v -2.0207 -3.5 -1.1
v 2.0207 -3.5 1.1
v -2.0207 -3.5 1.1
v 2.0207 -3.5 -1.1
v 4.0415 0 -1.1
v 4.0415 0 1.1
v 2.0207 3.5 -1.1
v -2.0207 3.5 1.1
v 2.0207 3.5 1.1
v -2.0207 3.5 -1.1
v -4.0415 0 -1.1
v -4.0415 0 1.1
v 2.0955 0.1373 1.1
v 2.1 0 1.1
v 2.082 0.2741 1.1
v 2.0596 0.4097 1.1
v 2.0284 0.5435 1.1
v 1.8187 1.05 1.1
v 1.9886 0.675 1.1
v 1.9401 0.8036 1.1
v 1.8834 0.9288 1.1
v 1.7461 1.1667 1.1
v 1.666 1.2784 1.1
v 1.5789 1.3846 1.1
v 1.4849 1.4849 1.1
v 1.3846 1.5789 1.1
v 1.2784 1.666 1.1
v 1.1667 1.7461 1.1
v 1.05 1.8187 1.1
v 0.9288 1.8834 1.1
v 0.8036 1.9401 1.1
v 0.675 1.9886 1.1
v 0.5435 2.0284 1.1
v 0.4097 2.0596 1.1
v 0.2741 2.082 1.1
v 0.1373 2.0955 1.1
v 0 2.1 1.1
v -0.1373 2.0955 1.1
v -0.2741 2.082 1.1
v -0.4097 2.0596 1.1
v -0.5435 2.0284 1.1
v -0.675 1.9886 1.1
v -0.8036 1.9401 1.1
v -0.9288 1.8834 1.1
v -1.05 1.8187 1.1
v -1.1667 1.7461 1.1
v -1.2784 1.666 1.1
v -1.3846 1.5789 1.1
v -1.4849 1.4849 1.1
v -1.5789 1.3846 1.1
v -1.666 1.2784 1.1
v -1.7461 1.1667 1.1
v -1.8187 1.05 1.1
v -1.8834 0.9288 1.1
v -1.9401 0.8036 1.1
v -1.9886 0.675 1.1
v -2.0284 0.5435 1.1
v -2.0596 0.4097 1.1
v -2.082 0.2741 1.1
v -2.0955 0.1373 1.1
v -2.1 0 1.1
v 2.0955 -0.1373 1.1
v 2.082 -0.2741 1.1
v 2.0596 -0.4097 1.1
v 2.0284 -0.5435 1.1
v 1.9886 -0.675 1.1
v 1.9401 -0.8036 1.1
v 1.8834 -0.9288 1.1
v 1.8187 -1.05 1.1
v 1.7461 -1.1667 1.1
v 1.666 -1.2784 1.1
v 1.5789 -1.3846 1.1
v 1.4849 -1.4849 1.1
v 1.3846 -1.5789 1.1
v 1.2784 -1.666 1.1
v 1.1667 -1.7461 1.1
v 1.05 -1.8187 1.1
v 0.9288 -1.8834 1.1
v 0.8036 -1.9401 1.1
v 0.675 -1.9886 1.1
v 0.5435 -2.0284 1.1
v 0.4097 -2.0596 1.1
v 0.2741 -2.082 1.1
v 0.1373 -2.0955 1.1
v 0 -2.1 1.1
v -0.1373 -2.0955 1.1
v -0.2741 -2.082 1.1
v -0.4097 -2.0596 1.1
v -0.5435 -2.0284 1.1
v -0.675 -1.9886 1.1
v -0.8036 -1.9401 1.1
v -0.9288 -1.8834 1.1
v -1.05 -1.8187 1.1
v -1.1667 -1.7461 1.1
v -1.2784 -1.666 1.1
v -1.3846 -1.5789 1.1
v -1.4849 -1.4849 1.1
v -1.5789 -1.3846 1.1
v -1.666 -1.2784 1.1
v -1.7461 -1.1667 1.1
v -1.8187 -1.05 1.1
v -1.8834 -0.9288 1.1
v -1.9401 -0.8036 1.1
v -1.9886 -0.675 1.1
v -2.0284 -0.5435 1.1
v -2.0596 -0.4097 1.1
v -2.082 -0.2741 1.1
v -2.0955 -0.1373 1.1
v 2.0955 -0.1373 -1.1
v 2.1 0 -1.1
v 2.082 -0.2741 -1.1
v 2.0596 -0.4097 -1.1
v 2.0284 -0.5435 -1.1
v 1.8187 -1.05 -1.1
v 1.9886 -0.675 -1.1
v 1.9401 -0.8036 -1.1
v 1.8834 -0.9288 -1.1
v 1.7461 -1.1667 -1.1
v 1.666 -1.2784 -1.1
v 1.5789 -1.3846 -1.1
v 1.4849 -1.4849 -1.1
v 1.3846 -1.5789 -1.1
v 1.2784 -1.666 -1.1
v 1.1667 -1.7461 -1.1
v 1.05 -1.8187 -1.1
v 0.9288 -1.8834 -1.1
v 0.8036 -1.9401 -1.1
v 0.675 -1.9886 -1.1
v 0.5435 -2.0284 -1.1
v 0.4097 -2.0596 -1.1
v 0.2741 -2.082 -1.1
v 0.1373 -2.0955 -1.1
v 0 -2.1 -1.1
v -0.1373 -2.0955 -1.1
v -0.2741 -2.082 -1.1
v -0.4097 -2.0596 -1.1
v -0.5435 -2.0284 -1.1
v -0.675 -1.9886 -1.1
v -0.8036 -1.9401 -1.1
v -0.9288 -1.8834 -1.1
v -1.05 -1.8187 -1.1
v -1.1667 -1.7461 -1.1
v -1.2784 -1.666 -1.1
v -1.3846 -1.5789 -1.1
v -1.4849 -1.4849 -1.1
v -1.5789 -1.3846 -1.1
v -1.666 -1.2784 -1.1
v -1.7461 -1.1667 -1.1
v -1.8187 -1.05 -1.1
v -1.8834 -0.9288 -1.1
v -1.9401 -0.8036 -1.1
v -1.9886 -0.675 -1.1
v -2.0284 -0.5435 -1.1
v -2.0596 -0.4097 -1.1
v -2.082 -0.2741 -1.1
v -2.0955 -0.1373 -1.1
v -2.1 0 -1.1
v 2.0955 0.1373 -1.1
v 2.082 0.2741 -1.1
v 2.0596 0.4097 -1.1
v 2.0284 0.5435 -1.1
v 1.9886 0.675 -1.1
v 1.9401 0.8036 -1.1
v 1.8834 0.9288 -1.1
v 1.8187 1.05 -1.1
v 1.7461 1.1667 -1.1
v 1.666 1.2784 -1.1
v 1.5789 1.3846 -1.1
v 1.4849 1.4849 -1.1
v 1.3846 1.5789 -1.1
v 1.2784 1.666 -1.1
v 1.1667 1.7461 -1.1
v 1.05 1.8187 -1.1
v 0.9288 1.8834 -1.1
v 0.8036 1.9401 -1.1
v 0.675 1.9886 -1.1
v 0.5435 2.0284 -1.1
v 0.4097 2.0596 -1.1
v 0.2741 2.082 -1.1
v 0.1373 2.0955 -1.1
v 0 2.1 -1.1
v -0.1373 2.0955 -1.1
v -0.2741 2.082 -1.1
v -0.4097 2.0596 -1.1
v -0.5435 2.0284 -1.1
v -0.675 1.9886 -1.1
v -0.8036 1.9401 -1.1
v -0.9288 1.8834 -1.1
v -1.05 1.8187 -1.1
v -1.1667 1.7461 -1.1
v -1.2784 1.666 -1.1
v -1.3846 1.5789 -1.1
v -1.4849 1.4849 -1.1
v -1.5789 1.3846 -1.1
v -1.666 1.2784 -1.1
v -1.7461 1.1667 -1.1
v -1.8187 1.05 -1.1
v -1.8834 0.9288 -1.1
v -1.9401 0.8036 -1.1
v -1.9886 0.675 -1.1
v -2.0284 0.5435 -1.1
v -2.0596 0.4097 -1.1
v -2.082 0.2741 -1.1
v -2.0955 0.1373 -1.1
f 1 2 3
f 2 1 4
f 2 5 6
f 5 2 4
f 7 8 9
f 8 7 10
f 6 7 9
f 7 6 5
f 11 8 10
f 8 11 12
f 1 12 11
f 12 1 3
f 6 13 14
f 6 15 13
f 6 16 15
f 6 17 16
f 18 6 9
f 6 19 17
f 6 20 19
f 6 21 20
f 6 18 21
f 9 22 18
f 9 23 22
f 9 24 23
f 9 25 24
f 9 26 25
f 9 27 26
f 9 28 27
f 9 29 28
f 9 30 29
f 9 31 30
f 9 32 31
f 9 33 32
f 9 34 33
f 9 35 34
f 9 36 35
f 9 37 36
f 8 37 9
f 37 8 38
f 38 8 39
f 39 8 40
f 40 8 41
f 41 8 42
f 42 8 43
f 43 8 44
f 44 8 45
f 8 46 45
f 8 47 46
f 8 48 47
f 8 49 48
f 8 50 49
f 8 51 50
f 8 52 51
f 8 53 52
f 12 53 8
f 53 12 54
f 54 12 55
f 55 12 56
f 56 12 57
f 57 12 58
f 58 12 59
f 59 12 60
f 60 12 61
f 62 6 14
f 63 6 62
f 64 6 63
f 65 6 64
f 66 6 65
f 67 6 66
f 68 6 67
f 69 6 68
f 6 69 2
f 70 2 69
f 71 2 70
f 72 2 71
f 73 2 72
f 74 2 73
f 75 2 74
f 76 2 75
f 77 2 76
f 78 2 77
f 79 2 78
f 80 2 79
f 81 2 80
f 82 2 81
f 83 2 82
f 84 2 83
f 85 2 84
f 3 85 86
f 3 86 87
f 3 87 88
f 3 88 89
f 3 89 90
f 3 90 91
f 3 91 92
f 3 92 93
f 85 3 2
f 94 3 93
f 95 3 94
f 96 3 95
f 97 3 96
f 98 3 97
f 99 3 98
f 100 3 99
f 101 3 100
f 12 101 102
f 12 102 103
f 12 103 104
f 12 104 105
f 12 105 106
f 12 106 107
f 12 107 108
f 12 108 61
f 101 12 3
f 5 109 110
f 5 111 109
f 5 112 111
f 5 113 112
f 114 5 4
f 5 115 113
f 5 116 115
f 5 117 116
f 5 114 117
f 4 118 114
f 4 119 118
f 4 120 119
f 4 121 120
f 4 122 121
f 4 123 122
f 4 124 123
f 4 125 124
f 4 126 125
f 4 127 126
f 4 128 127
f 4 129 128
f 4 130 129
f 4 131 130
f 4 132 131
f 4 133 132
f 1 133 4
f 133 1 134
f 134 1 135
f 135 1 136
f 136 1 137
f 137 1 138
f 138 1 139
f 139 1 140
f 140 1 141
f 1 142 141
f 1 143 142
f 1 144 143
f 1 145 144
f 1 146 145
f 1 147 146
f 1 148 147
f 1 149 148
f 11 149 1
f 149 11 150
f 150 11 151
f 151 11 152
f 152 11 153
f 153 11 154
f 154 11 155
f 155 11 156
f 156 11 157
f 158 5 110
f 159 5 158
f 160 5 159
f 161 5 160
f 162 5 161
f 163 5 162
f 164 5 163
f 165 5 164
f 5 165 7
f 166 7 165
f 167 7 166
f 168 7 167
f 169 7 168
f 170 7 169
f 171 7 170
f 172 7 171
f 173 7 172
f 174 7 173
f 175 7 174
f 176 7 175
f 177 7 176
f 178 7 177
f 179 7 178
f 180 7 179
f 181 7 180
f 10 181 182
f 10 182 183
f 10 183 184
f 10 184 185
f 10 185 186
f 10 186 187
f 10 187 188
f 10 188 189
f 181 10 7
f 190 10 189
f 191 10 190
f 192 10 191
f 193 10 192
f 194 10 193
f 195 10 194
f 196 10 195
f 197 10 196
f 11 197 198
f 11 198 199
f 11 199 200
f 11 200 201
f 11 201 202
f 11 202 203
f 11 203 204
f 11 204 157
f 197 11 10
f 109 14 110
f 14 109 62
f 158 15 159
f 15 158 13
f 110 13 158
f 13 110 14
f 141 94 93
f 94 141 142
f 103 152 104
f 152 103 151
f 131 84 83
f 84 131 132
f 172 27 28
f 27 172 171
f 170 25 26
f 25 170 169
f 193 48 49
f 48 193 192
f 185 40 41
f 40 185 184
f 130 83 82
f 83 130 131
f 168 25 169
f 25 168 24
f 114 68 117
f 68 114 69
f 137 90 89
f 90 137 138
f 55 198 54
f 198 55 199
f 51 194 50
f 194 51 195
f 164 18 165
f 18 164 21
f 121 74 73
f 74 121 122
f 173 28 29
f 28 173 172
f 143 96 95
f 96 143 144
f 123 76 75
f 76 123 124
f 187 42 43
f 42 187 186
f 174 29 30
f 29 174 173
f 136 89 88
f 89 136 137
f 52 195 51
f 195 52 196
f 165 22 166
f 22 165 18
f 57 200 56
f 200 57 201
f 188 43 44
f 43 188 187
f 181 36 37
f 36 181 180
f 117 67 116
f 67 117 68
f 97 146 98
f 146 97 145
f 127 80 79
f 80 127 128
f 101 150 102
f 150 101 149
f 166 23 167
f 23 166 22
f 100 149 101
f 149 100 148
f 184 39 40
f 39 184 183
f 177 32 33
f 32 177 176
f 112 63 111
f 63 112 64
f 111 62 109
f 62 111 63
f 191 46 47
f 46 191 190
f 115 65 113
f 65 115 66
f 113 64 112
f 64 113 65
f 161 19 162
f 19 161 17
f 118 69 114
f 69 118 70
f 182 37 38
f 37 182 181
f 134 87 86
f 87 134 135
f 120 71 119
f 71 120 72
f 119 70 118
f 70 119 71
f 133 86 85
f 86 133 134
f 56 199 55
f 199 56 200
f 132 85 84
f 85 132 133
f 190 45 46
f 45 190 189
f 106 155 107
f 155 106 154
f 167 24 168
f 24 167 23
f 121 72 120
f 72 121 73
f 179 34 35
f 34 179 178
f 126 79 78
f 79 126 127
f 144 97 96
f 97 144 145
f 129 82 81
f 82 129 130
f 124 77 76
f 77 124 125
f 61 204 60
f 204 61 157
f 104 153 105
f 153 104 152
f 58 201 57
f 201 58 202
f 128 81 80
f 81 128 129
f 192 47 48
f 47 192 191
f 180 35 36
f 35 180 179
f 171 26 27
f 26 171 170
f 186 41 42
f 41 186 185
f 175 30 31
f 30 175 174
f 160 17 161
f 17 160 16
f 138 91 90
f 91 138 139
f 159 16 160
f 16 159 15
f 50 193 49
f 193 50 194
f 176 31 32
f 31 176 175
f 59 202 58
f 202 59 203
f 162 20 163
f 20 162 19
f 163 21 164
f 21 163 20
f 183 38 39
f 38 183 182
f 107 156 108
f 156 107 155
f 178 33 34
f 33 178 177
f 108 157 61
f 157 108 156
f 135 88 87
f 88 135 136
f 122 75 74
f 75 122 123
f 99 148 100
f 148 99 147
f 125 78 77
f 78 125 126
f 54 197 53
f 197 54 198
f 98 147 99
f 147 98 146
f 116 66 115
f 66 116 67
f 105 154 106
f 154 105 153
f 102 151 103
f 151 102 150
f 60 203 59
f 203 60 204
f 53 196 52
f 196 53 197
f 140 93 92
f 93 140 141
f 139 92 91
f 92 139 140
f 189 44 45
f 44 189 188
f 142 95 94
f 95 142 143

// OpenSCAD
// Thin hex nut: 4.0mm screw clearance, 7.0mm across flats, 2.2mm thick

af = 7.0;          // across flats (mm)
thk = 2.2;         // thickness (mm)
hole_d = 4.0;      // through-hole diameter (mm)
clearance = 0.2;   // small extra clearance (mm)

$fn = 96;

module hex_nut(af, thk, hole_d) {
    // For a 6-sided cylinder, OpenSCAD's r is circumradius.
    // Across flats = 2 * r * cos(30)  =>  r = af / (2*cos(30))
    r_hex = af / (2 * cos(30));

    difference() {
        // Centered body for robust boolean ops and easy verification
        cylinder(h = thk, r = r_hex, $fn = 6, center = true);

        // Through-hole, extended beyond thickness to guarantee a clean cut
        cylinder(h = thk + 2, r = (hole_d + clearance) / 2, $fn = 96, center = true);
    }
}

hex_nut(af, thk, hole_d);
